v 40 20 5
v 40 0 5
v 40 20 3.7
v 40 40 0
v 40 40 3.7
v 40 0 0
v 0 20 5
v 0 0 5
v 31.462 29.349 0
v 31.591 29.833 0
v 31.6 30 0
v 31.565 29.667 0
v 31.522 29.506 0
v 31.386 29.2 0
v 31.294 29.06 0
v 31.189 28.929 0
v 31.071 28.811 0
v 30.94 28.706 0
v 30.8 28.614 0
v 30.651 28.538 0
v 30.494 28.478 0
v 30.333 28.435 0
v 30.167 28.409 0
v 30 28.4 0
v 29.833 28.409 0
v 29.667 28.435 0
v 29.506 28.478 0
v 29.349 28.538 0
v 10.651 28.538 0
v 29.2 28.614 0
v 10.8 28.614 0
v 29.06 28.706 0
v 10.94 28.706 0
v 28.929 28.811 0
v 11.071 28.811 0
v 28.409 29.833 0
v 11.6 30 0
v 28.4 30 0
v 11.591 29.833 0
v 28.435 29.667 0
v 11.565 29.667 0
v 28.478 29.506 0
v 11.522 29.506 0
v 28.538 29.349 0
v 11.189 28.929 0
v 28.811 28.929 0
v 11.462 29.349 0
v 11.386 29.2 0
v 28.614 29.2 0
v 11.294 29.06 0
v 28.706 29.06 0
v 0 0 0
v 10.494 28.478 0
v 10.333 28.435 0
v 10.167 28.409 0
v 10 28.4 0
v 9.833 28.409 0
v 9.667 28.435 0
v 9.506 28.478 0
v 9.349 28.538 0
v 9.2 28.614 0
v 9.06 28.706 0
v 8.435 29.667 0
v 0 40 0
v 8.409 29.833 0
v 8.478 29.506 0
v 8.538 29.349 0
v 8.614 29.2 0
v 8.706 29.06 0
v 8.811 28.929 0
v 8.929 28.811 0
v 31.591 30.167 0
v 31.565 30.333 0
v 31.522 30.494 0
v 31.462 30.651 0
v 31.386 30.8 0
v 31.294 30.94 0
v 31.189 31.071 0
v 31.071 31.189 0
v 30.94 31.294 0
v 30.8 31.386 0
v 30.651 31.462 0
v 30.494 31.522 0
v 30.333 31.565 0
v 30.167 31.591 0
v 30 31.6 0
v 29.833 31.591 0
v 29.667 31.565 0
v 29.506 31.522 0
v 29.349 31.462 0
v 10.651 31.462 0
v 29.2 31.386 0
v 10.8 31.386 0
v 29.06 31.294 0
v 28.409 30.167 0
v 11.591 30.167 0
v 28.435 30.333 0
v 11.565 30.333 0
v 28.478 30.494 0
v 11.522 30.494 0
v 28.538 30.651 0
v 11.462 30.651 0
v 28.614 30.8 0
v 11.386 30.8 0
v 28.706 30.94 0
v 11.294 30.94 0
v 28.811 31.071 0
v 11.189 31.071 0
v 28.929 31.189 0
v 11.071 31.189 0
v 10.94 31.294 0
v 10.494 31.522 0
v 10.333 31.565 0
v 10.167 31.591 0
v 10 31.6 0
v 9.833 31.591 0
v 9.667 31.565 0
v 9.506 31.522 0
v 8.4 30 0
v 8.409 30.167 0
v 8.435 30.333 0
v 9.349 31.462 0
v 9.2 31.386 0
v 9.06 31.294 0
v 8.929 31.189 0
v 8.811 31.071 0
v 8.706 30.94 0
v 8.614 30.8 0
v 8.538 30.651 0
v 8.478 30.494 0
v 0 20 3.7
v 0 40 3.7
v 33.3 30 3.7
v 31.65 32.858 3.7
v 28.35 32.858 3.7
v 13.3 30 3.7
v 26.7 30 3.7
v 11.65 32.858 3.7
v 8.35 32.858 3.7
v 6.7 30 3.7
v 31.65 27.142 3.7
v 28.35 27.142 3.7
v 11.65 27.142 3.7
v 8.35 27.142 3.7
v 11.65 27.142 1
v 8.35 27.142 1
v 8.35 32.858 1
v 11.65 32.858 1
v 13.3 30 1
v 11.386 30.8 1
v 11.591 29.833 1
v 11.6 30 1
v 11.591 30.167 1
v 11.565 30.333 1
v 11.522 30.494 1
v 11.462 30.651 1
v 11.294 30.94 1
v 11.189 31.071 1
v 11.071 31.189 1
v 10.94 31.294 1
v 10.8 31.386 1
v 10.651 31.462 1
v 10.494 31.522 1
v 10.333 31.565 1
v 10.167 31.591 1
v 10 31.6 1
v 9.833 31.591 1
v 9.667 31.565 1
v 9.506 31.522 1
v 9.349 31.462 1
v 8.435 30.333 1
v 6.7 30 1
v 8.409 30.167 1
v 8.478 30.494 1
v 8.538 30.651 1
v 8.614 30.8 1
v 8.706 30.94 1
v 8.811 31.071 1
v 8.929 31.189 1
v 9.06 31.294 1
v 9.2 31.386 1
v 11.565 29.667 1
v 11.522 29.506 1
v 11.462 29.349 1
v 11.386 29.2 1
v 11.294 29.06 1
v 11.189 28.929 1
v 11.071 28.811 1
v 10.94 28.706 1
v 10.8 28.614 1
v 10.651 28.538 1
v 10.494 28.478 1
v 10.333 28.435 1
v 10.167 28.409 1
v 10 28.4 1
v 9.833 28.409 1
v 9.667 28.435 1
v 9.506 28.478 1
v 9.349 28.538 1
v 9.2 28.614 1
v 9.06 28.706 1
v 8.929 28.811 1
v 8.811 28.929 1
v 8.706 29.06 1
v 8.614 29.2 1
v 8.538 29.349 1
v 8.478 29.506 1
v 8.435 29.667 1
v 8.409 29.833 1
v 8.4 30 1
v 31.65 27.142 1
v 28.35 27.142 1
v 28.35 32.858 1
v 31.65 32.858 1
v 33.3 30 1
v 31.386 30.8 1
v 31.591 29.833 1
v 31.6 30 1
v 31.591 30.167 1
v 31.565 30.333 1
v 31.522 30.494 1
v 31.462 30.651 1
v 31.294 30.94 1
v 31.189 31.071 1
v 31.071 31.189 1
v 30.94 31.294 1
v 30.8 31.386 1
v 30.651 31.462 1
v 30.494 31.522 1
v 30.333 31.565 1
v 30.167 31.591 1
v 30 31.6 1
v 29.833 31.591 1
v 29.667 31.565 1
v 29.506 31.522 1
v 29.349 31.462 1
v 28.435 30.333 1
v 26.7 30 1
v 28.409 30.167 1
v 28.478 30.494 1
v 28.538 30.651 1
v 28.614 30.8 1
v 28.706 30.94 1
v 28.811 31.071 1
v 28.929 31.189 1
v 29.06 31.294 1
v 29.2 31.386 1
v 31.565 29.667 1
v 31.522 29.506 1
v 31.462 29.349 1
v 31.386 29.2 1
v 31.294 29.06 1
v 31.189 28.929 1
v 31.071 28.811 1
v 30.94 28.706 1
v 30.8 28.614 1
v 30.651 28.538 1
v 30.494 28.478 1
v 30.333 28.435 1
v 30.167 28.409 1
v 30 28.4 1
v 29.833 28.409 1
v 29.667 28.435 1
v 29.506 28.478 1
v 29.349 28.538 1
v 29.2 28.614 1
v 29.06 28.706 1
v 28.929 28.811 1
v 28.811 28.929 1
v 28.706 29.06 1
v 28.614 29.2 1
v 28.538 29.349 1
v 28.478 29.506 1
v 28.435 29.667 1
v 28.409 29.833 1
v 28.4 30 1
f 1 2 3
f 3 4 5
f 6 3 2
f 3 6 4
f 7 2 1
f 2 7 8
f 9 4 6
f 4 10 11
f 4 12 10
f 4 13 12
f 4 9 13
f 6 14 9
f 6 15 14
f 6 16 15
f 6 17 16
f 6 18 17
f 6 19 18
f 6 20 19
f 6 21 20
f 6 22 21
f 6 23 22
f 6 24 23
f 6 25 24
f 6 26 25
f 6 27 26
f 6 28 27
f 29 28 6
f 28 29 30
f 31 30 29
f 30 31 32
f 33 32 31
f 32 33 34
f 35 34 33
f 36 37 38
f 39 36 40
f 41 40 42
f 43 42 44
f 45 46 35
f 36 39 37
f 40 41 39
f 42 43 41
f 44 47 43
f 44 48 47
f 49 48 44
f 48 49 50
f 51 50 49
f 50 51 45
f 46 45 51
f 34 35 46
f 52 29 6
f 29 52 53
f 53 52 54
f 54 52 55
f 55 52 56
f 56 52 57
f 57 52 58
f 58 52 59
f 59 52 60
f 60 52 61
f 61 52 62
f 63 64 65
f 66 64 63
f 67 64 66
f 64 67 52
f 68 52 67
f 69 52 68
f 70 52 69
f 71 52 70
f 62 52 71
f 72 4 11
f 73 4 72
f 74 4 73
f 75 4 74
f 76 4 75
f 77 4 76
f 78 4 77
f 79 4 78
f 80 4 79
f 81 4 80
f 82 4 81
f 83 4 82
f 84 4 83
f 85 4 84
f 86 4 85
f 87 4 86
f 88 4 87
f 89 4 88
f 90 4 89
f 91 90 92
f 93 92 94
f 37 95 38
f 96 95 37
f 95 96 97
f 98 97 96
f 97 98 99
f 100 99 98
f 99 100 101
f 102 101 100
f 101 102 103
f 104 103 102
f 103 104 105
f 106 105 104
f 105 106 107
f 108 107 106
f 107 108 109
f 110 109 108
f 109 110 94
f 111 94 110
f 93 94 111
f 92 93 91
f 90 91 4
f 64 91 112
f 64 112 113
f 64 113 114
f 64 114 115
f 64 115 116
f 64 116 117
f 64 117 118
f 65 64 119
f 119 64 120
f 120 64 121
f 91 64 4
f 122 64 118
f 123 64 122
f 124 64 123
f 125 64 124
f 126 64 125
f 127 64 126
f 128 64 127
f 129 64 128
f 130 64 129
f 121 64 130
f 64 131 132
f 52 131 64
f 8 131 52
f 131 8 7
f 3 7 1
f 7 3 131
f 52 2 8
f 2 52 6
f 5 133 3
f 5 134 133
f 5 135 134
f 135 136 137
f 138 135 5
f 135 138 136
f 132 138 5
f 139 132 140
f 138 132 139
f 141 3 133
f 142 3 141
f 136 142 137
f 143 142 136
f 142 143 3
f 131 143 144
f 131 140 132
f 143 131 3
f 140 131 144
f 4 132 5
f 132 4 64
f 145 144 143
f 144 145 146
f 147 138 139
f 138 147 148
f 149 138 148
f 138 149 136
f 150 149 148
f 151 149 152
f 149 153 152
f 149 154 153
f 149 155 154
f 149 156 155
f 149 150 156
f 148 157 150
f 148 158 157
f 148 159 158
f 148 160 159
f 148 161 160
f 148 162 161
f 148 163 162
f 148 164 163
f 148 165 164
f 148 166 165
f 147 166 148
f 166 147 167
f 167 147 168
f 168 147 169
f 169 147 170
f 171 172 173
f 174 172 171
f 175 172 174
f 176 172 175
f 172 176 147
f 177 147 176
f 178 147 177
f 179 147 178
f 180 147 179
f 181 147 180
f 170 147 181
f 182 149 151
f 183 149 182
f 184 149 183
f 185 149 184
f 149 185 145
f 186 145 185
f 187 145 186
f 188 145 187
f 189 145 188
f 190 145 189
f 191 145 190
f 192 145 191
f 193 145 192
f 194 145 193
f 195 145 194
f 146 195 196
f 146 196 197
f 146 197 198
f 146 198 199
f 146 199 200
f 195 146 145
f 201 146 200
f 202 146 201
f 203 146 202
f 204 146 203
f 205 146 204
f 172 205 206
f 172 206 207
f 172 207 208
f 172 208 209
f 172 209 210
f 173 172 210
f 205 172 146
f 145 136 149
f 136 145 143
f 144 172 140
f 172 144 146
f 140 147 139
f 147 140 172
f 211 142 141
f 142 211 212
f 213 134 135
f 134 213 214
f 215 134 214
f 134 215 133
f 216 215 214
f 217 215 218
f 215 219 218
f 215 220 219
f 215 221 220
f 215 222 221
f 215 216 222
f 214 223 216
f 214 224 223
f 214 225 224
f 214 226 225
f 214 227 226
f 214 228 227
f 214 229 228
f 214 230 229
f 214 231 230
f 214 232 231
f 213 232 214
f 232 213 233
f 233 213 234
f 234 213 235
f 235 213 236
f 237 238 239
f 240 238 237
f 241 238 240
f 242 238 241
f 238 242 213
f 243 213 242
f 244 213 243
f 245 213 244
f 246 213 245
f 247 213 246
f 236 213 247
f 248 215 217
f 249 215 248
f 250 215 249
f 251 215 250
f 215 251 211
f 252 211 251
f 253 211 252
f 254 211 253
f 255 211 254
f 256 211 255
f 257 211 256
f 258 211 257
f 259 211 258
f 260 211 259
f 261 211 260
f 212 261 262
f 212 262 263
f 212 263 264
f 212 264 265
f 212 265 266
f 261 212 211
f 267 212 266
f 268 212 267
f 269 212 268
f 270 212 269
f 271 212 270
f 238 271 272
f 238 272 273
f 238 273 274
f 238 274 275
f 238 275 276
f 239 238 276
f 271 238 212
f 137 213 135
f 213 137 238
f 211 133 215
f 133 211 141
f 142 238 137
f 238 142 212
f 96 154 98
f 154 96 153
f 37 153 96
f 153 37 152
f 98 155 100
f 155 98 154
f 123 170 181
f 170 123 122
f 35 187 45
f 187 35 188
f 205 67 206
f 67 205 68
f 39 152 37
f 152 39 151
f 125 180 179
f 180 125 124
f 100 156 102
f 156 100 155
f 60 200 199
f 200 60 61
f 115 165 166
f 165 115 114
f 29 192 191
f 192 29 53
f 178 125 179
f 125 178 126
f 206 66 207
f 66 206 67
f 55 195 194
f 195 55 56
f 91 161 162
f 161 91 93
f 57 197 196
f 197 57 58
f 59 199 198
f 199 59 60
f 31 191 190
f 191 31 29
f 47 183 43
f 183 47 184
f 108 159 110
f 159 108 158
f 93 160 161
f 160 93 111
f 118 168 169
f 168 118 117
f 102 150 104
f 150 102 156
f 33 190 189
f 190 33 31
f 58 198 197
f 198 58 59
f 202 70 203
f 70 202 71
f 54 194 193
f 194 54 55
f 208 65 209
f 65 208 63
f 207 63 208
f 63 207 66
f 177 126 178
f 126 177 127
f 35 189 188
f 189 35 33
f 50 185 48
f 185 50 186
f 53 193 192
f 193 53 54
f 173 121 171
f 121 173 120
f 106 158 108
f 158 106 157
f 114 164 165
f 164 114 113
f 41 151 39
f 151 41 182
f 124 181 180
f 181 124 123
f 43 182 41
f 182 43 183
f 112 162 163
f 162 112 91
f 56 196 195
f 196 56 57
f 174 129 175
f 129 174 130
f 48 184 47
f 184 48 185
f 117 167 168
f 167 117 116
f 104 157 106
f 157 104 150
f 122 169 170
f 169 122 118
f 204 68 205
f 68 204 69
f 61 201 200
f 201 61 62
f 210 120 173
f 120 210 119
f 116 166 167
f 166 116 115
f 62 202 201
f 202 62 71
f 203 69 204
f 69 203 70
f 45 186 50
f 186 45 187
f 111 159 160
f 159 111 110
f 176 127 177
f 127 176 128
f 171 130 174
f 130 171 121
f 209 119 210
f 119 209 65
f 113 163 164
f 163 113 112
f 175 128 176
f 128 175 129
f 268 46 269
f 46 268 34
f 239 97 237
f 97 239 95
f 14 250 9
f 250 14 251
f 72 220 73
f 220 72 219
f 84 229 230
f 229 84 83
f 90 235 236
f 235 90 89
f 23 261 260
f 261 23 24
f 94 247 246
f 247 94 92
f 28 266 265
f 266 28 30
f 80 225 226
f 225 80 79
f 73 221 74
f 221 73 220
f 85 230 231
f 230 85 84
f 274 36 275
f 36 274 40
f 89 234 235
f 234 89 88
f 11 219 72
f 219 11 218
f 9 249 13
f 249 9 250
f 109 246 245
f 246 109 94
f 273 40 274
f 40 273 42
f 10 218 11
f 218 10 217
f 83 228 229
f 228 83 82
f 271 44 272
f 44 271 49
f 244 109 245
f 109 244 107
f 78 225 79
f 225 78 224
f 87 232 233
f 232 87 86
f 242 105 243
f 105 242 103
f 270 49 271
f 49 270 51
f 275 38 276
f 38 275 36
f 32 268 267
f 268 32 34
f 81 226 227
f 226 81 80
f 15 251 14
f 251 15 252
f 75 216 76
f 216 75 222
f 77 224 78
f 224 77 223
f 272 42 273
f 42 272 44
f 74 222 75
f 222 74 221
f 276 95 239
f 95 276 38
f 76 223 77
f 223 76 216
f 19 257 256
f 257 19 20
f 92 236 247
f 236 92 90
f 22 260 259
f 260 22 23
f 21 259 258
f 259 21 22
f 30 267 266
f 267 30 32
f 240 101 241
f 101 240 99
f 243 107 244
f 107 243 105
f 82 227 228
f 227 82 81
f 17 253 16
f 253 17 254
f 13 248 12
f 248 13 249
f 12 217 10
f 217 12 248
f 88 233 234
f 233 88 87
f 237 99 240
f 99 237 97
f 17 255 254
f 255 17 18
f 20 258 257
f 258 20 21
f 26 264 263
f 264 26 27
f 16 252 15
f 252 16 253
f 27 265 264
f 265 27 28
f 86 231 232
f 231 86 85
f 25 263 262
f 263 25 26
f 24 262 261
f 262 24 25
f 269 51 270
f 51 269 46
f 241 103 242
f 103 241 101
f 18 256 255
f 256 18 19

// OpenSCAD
m_w = 40;
m_h = 20;
m_h2 = 20;
m_thk = 5;

nut_d = 6.6;
nut_t = 2.8;
hole_d = 3.2;

module _A () {
    cube([m_w,m_h,m_thk]);
    translate([0,m_h,0]) cube([m_w,m_h2,m_thk-1.3]);
}

module _B () {
    difference() {
        //cube([m_w,m_h+m_h2,m_thk]);
        _A();
        translate([m_w/4,m_h+m_h2/2,1]) cylinder(nut_t, d=nut_d, $fn=6);
        translate([m_w-m_w/4,m_h+m_h2/2,1]) cylinder(nut_t, d=nut_d, $fn=6);
        translate([m_w/4,m_h+m_h2/2,-.1]) cylinder(m_thk, d=hole_d, $fn=60);
        translate([m_w-m_w/4,m_h+m_h2/2,-.1]) cylinder(m_thk, d=hole_d, $fn=60);
    }
}

//_A();
//translate([m_w+5,0,0]) _B();
_B();
